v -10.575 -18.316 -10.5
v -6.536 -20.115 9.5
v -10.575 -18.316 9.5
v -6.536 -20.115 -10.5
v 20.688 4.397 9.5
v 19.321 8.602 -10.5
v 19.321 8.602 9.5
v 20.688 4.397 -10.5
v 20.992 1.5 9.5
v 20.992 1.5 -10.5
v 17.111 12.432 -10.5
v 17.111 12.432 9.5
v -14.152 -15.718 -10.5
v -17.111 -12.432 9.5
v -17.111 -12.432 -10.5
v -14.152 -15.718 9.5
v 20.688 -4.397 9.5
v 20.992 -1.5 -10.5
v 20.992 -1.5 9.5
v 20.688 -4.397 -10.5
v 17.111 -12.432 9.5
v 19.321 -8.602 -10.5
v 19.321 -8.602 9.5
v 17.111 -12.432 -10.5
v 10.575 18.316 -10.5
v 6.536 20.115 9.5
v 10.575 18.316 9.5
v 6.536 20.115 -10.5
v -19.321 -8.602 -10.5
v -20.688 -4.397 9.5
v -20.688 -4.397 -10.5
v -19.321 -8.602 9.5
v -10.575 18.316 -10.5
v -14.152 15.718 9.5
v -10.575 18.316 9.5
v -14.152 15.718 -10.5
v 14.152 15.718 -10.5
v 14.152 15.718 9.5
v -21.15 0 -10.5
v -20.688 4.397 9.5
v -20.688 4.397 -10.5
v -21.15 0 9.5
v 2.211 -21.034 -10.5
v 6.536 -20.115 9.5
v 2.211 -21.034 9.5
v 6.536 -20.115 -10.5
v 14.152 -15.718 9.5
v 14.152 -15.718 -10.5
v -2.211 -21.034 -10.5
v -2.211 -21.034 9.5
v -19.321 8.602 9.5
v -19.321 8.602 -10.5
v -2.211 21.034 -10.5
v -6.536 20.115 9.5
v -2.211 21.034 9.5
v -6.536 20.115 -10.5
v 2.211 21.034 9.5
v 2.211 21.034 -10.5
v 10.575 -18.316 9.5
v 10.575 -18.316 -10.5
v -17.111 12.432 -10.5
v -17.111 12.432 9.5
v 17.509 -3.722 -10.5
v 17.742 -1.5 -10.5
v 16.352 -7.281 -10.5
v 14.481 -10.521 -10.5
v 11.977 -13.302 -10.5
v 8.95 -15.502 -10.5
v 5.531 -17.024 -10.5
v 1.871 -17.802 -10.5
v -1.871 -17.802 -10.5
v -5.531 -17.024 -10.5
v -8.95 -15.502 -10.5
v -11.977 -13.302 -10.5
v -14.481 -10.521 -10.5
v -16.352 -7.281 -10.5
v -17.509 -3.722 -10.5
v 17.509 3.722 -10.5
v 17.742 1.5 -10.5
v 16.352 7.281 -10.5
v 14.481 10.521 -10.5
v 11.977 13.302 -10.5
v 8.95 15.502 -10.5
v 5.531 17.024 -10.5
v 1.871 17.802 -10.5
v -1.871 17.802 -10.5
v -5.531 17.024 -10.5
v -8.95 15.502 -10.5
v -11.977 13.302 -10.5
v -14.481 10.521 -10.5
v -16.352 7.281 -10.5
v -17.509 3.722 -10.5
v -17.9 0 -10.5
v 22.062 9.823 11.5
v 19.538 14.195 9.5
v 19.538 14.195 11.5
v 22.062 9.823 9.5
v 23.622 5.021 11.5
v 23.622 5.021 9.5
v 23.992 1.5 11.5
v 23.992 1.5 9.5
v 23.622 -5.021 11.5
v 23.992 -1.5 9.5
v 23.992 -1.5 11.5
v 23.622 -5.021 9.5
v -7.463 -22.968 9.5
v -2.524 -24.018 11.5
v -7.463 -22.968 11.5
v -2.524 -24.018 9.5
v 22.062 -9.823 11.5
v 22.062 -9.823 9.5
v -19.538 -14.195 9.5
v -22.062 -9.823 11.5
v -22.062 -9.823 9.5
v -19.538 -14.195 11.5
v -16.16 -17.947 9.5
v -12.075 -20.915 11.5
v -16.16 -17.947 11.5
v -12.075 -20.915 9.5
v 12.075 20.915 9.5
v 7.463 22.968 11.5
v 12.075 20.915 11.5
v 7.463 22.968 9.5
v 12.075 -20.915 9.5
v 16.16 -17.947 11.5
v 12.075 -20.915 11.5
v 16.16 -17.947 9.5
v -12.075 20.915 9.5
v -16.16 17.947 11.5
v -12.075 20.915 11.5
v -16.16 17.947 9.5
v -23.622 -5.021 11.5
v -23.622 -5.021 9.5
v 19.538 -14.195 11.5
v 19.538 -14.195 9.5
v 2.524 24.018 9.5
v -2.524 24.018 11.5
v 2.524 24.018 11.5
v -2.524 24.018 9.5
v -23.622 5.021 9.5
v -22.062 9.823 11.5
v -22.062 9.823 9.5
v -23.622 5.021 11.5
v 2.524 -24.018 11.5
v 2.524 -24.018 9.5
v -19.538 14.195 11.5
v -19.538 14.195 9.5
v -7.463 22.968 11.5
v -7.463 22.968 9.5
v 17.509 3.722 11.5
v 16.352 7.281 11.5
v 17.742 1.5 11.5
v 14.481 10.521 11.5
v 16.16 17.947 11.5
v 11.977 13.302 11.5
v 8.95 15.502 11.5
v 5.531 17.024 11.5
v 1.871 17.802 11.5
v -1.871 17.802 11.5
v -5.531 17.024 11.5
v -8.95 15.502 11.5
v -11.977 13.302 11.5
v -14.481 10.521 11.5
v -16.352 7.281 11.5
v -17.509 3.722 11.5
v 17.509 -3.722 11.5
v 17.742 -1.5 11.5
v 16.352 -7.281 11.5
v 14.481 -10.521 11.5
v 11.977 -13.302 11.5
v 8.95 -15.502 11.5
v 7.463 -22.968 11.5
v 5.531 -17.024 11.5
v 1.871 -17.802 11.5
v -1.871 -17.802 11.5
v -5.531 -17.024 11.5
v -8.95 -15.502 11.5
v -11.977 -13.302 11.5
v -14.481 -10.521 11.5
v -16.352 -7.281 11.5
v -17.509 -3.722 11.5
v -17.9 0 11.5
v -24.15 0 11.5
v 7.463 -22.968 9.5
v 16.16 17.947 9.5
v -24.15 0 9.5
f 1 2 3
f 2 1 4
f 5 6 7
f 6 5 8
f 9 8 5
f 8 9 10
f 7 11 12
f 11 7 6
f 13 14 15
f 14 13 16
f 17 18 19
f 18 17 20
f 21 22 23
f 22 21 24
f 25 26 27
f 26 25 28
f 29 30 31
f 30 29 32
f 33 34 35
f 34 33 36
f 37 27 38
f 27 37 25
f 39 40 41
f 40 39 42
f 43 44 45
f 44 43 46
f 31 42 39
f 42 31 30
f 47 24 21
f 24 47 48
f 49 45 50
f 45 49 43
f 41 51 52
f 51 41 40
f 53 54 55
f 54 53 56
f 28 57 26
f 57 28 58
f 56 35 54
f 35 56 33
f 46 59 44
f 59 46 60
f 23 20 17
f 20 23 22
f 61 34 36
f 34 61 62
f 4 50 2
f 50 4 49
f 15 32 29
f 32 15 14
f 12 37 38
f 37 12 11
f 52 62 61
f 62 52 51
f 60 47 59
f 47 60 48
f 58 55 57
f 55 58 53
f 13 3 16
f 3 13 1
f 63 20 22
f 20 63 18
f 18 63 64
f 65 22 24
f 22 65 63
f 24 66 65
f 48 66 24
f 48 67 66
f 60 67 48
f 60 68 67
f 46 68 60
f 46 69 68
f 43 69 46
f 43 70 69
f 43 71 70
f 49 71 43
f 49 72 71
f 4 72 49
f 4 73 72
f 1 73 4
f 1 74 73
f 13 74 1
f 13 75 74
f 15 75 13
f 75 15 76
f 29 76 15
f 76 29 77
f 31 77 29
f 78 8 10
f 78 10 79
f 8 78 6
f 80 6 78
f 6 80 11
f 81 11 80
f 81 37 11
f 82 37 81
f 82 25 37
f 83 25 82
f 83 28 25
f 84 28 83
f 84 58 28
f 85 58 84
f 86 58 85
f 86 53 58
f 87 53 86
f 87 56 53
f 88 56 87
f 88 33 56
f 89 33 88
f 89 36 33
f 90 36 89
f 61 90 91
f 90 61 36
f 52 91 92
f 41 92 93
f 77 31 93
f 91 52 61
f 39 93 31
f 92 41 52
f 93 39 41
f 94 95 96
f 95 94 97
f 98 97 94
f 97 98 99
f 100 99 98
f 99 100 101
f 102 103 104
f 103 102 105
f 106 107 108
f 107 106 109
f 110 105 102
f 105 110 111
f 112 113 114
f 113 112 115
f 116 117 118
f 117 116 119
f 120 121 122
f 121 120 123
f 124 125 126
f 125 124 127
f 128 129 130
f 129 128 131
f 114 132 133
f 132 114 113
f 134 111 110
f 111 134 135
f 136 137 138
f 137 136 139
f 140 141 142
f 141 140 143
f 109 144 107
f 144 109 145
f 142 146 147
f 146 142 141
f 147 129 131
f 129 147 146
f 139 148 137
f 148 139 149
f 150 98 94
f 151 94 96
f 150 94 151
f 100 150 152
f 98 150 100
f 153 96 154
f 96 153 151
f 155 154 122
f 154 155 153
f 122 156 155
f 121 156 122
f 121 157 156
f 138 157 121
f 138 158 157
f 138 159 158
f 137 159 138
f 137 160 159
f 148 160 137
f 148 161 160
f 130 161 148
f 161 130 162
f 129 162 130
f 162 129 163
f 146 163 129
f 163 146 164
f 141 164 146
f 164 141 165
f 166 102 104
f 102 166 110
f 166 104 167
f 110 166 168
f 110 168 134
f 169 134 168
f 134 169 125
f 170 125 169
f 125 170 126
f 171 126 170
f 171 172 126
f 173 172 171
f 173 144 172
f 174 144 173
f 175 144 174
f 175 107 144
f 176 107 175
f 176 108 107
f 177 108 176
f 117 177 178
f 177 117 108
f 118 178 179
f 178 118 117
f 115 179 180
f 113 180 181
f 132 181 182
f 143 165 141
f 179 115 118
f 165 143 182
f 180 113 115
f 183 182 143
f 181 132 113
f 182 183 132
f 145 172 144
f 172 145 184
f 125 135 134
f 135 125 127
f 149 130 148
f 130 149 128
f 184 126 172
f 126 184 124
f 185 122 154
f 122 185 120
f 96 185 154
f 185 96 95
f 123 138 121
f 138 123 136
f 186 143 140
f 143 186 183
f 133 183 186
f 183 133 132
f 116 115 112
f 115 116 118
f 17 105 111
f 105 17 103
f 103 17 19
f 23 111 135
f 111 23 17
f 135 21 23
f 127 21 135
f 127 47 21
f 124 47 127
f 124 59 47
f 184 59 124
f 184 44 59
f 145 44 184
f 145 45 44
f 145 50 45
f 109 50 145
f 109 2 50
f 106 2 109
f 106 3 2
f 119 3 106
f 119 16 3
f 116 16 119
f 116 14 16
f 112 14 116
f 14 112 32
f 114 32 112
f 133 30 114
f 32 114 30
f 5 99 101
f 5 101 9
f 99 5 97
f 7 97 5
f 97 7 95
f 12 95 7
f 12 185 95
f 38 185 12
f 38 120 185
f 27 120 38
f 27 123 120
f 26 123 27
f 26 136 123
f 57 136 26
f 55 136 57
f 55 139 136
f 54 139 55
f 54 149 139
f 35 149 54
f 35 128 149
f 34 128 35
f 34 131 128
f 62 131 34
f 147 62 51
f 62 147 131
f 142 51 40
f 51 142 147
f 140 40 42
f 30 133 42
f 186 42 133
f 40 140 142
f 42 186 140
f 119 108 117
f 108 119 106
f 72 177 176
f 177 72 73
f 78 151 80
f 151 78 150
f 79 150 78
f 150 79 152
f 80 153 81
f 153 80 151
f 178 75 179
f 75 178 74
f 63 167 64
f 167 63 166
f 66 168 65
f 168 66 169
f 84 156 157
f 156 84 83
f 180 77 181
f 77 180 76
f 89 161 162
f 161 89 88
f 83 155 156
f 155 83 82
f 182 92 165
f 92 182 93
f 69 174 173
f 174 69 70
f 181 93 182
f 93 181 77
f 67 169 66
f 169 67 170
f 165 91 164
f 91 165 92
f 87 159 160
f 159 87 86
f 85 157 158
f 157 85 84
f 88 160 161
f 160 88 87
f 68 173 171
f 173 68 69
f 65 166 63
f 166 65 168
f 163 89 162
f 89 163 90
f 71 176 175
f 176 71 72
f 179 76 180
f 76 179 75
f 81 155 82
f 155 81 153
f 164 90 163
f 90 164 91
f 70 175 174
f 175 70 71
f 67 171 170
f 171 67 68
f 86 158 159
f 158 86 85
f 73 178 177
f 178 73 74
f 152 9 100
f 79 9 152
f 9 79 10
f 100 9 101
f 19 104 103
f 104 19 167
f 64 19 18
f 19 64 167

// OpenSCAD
outer=42.3;
inner = 35.8;
h=21;
$fs=.2;

difference() {
	union() {
		cylinder(d=outer,h=h,center=true);
		translate([0,0,h/2]) cylinder(d=outer+6,h=2,center=true);
	}
	cylinder(d=inner,h=h+3,center=true);
	translate([inner/2-1,0,0])cube([inner,3,h+13],center=true );
}
